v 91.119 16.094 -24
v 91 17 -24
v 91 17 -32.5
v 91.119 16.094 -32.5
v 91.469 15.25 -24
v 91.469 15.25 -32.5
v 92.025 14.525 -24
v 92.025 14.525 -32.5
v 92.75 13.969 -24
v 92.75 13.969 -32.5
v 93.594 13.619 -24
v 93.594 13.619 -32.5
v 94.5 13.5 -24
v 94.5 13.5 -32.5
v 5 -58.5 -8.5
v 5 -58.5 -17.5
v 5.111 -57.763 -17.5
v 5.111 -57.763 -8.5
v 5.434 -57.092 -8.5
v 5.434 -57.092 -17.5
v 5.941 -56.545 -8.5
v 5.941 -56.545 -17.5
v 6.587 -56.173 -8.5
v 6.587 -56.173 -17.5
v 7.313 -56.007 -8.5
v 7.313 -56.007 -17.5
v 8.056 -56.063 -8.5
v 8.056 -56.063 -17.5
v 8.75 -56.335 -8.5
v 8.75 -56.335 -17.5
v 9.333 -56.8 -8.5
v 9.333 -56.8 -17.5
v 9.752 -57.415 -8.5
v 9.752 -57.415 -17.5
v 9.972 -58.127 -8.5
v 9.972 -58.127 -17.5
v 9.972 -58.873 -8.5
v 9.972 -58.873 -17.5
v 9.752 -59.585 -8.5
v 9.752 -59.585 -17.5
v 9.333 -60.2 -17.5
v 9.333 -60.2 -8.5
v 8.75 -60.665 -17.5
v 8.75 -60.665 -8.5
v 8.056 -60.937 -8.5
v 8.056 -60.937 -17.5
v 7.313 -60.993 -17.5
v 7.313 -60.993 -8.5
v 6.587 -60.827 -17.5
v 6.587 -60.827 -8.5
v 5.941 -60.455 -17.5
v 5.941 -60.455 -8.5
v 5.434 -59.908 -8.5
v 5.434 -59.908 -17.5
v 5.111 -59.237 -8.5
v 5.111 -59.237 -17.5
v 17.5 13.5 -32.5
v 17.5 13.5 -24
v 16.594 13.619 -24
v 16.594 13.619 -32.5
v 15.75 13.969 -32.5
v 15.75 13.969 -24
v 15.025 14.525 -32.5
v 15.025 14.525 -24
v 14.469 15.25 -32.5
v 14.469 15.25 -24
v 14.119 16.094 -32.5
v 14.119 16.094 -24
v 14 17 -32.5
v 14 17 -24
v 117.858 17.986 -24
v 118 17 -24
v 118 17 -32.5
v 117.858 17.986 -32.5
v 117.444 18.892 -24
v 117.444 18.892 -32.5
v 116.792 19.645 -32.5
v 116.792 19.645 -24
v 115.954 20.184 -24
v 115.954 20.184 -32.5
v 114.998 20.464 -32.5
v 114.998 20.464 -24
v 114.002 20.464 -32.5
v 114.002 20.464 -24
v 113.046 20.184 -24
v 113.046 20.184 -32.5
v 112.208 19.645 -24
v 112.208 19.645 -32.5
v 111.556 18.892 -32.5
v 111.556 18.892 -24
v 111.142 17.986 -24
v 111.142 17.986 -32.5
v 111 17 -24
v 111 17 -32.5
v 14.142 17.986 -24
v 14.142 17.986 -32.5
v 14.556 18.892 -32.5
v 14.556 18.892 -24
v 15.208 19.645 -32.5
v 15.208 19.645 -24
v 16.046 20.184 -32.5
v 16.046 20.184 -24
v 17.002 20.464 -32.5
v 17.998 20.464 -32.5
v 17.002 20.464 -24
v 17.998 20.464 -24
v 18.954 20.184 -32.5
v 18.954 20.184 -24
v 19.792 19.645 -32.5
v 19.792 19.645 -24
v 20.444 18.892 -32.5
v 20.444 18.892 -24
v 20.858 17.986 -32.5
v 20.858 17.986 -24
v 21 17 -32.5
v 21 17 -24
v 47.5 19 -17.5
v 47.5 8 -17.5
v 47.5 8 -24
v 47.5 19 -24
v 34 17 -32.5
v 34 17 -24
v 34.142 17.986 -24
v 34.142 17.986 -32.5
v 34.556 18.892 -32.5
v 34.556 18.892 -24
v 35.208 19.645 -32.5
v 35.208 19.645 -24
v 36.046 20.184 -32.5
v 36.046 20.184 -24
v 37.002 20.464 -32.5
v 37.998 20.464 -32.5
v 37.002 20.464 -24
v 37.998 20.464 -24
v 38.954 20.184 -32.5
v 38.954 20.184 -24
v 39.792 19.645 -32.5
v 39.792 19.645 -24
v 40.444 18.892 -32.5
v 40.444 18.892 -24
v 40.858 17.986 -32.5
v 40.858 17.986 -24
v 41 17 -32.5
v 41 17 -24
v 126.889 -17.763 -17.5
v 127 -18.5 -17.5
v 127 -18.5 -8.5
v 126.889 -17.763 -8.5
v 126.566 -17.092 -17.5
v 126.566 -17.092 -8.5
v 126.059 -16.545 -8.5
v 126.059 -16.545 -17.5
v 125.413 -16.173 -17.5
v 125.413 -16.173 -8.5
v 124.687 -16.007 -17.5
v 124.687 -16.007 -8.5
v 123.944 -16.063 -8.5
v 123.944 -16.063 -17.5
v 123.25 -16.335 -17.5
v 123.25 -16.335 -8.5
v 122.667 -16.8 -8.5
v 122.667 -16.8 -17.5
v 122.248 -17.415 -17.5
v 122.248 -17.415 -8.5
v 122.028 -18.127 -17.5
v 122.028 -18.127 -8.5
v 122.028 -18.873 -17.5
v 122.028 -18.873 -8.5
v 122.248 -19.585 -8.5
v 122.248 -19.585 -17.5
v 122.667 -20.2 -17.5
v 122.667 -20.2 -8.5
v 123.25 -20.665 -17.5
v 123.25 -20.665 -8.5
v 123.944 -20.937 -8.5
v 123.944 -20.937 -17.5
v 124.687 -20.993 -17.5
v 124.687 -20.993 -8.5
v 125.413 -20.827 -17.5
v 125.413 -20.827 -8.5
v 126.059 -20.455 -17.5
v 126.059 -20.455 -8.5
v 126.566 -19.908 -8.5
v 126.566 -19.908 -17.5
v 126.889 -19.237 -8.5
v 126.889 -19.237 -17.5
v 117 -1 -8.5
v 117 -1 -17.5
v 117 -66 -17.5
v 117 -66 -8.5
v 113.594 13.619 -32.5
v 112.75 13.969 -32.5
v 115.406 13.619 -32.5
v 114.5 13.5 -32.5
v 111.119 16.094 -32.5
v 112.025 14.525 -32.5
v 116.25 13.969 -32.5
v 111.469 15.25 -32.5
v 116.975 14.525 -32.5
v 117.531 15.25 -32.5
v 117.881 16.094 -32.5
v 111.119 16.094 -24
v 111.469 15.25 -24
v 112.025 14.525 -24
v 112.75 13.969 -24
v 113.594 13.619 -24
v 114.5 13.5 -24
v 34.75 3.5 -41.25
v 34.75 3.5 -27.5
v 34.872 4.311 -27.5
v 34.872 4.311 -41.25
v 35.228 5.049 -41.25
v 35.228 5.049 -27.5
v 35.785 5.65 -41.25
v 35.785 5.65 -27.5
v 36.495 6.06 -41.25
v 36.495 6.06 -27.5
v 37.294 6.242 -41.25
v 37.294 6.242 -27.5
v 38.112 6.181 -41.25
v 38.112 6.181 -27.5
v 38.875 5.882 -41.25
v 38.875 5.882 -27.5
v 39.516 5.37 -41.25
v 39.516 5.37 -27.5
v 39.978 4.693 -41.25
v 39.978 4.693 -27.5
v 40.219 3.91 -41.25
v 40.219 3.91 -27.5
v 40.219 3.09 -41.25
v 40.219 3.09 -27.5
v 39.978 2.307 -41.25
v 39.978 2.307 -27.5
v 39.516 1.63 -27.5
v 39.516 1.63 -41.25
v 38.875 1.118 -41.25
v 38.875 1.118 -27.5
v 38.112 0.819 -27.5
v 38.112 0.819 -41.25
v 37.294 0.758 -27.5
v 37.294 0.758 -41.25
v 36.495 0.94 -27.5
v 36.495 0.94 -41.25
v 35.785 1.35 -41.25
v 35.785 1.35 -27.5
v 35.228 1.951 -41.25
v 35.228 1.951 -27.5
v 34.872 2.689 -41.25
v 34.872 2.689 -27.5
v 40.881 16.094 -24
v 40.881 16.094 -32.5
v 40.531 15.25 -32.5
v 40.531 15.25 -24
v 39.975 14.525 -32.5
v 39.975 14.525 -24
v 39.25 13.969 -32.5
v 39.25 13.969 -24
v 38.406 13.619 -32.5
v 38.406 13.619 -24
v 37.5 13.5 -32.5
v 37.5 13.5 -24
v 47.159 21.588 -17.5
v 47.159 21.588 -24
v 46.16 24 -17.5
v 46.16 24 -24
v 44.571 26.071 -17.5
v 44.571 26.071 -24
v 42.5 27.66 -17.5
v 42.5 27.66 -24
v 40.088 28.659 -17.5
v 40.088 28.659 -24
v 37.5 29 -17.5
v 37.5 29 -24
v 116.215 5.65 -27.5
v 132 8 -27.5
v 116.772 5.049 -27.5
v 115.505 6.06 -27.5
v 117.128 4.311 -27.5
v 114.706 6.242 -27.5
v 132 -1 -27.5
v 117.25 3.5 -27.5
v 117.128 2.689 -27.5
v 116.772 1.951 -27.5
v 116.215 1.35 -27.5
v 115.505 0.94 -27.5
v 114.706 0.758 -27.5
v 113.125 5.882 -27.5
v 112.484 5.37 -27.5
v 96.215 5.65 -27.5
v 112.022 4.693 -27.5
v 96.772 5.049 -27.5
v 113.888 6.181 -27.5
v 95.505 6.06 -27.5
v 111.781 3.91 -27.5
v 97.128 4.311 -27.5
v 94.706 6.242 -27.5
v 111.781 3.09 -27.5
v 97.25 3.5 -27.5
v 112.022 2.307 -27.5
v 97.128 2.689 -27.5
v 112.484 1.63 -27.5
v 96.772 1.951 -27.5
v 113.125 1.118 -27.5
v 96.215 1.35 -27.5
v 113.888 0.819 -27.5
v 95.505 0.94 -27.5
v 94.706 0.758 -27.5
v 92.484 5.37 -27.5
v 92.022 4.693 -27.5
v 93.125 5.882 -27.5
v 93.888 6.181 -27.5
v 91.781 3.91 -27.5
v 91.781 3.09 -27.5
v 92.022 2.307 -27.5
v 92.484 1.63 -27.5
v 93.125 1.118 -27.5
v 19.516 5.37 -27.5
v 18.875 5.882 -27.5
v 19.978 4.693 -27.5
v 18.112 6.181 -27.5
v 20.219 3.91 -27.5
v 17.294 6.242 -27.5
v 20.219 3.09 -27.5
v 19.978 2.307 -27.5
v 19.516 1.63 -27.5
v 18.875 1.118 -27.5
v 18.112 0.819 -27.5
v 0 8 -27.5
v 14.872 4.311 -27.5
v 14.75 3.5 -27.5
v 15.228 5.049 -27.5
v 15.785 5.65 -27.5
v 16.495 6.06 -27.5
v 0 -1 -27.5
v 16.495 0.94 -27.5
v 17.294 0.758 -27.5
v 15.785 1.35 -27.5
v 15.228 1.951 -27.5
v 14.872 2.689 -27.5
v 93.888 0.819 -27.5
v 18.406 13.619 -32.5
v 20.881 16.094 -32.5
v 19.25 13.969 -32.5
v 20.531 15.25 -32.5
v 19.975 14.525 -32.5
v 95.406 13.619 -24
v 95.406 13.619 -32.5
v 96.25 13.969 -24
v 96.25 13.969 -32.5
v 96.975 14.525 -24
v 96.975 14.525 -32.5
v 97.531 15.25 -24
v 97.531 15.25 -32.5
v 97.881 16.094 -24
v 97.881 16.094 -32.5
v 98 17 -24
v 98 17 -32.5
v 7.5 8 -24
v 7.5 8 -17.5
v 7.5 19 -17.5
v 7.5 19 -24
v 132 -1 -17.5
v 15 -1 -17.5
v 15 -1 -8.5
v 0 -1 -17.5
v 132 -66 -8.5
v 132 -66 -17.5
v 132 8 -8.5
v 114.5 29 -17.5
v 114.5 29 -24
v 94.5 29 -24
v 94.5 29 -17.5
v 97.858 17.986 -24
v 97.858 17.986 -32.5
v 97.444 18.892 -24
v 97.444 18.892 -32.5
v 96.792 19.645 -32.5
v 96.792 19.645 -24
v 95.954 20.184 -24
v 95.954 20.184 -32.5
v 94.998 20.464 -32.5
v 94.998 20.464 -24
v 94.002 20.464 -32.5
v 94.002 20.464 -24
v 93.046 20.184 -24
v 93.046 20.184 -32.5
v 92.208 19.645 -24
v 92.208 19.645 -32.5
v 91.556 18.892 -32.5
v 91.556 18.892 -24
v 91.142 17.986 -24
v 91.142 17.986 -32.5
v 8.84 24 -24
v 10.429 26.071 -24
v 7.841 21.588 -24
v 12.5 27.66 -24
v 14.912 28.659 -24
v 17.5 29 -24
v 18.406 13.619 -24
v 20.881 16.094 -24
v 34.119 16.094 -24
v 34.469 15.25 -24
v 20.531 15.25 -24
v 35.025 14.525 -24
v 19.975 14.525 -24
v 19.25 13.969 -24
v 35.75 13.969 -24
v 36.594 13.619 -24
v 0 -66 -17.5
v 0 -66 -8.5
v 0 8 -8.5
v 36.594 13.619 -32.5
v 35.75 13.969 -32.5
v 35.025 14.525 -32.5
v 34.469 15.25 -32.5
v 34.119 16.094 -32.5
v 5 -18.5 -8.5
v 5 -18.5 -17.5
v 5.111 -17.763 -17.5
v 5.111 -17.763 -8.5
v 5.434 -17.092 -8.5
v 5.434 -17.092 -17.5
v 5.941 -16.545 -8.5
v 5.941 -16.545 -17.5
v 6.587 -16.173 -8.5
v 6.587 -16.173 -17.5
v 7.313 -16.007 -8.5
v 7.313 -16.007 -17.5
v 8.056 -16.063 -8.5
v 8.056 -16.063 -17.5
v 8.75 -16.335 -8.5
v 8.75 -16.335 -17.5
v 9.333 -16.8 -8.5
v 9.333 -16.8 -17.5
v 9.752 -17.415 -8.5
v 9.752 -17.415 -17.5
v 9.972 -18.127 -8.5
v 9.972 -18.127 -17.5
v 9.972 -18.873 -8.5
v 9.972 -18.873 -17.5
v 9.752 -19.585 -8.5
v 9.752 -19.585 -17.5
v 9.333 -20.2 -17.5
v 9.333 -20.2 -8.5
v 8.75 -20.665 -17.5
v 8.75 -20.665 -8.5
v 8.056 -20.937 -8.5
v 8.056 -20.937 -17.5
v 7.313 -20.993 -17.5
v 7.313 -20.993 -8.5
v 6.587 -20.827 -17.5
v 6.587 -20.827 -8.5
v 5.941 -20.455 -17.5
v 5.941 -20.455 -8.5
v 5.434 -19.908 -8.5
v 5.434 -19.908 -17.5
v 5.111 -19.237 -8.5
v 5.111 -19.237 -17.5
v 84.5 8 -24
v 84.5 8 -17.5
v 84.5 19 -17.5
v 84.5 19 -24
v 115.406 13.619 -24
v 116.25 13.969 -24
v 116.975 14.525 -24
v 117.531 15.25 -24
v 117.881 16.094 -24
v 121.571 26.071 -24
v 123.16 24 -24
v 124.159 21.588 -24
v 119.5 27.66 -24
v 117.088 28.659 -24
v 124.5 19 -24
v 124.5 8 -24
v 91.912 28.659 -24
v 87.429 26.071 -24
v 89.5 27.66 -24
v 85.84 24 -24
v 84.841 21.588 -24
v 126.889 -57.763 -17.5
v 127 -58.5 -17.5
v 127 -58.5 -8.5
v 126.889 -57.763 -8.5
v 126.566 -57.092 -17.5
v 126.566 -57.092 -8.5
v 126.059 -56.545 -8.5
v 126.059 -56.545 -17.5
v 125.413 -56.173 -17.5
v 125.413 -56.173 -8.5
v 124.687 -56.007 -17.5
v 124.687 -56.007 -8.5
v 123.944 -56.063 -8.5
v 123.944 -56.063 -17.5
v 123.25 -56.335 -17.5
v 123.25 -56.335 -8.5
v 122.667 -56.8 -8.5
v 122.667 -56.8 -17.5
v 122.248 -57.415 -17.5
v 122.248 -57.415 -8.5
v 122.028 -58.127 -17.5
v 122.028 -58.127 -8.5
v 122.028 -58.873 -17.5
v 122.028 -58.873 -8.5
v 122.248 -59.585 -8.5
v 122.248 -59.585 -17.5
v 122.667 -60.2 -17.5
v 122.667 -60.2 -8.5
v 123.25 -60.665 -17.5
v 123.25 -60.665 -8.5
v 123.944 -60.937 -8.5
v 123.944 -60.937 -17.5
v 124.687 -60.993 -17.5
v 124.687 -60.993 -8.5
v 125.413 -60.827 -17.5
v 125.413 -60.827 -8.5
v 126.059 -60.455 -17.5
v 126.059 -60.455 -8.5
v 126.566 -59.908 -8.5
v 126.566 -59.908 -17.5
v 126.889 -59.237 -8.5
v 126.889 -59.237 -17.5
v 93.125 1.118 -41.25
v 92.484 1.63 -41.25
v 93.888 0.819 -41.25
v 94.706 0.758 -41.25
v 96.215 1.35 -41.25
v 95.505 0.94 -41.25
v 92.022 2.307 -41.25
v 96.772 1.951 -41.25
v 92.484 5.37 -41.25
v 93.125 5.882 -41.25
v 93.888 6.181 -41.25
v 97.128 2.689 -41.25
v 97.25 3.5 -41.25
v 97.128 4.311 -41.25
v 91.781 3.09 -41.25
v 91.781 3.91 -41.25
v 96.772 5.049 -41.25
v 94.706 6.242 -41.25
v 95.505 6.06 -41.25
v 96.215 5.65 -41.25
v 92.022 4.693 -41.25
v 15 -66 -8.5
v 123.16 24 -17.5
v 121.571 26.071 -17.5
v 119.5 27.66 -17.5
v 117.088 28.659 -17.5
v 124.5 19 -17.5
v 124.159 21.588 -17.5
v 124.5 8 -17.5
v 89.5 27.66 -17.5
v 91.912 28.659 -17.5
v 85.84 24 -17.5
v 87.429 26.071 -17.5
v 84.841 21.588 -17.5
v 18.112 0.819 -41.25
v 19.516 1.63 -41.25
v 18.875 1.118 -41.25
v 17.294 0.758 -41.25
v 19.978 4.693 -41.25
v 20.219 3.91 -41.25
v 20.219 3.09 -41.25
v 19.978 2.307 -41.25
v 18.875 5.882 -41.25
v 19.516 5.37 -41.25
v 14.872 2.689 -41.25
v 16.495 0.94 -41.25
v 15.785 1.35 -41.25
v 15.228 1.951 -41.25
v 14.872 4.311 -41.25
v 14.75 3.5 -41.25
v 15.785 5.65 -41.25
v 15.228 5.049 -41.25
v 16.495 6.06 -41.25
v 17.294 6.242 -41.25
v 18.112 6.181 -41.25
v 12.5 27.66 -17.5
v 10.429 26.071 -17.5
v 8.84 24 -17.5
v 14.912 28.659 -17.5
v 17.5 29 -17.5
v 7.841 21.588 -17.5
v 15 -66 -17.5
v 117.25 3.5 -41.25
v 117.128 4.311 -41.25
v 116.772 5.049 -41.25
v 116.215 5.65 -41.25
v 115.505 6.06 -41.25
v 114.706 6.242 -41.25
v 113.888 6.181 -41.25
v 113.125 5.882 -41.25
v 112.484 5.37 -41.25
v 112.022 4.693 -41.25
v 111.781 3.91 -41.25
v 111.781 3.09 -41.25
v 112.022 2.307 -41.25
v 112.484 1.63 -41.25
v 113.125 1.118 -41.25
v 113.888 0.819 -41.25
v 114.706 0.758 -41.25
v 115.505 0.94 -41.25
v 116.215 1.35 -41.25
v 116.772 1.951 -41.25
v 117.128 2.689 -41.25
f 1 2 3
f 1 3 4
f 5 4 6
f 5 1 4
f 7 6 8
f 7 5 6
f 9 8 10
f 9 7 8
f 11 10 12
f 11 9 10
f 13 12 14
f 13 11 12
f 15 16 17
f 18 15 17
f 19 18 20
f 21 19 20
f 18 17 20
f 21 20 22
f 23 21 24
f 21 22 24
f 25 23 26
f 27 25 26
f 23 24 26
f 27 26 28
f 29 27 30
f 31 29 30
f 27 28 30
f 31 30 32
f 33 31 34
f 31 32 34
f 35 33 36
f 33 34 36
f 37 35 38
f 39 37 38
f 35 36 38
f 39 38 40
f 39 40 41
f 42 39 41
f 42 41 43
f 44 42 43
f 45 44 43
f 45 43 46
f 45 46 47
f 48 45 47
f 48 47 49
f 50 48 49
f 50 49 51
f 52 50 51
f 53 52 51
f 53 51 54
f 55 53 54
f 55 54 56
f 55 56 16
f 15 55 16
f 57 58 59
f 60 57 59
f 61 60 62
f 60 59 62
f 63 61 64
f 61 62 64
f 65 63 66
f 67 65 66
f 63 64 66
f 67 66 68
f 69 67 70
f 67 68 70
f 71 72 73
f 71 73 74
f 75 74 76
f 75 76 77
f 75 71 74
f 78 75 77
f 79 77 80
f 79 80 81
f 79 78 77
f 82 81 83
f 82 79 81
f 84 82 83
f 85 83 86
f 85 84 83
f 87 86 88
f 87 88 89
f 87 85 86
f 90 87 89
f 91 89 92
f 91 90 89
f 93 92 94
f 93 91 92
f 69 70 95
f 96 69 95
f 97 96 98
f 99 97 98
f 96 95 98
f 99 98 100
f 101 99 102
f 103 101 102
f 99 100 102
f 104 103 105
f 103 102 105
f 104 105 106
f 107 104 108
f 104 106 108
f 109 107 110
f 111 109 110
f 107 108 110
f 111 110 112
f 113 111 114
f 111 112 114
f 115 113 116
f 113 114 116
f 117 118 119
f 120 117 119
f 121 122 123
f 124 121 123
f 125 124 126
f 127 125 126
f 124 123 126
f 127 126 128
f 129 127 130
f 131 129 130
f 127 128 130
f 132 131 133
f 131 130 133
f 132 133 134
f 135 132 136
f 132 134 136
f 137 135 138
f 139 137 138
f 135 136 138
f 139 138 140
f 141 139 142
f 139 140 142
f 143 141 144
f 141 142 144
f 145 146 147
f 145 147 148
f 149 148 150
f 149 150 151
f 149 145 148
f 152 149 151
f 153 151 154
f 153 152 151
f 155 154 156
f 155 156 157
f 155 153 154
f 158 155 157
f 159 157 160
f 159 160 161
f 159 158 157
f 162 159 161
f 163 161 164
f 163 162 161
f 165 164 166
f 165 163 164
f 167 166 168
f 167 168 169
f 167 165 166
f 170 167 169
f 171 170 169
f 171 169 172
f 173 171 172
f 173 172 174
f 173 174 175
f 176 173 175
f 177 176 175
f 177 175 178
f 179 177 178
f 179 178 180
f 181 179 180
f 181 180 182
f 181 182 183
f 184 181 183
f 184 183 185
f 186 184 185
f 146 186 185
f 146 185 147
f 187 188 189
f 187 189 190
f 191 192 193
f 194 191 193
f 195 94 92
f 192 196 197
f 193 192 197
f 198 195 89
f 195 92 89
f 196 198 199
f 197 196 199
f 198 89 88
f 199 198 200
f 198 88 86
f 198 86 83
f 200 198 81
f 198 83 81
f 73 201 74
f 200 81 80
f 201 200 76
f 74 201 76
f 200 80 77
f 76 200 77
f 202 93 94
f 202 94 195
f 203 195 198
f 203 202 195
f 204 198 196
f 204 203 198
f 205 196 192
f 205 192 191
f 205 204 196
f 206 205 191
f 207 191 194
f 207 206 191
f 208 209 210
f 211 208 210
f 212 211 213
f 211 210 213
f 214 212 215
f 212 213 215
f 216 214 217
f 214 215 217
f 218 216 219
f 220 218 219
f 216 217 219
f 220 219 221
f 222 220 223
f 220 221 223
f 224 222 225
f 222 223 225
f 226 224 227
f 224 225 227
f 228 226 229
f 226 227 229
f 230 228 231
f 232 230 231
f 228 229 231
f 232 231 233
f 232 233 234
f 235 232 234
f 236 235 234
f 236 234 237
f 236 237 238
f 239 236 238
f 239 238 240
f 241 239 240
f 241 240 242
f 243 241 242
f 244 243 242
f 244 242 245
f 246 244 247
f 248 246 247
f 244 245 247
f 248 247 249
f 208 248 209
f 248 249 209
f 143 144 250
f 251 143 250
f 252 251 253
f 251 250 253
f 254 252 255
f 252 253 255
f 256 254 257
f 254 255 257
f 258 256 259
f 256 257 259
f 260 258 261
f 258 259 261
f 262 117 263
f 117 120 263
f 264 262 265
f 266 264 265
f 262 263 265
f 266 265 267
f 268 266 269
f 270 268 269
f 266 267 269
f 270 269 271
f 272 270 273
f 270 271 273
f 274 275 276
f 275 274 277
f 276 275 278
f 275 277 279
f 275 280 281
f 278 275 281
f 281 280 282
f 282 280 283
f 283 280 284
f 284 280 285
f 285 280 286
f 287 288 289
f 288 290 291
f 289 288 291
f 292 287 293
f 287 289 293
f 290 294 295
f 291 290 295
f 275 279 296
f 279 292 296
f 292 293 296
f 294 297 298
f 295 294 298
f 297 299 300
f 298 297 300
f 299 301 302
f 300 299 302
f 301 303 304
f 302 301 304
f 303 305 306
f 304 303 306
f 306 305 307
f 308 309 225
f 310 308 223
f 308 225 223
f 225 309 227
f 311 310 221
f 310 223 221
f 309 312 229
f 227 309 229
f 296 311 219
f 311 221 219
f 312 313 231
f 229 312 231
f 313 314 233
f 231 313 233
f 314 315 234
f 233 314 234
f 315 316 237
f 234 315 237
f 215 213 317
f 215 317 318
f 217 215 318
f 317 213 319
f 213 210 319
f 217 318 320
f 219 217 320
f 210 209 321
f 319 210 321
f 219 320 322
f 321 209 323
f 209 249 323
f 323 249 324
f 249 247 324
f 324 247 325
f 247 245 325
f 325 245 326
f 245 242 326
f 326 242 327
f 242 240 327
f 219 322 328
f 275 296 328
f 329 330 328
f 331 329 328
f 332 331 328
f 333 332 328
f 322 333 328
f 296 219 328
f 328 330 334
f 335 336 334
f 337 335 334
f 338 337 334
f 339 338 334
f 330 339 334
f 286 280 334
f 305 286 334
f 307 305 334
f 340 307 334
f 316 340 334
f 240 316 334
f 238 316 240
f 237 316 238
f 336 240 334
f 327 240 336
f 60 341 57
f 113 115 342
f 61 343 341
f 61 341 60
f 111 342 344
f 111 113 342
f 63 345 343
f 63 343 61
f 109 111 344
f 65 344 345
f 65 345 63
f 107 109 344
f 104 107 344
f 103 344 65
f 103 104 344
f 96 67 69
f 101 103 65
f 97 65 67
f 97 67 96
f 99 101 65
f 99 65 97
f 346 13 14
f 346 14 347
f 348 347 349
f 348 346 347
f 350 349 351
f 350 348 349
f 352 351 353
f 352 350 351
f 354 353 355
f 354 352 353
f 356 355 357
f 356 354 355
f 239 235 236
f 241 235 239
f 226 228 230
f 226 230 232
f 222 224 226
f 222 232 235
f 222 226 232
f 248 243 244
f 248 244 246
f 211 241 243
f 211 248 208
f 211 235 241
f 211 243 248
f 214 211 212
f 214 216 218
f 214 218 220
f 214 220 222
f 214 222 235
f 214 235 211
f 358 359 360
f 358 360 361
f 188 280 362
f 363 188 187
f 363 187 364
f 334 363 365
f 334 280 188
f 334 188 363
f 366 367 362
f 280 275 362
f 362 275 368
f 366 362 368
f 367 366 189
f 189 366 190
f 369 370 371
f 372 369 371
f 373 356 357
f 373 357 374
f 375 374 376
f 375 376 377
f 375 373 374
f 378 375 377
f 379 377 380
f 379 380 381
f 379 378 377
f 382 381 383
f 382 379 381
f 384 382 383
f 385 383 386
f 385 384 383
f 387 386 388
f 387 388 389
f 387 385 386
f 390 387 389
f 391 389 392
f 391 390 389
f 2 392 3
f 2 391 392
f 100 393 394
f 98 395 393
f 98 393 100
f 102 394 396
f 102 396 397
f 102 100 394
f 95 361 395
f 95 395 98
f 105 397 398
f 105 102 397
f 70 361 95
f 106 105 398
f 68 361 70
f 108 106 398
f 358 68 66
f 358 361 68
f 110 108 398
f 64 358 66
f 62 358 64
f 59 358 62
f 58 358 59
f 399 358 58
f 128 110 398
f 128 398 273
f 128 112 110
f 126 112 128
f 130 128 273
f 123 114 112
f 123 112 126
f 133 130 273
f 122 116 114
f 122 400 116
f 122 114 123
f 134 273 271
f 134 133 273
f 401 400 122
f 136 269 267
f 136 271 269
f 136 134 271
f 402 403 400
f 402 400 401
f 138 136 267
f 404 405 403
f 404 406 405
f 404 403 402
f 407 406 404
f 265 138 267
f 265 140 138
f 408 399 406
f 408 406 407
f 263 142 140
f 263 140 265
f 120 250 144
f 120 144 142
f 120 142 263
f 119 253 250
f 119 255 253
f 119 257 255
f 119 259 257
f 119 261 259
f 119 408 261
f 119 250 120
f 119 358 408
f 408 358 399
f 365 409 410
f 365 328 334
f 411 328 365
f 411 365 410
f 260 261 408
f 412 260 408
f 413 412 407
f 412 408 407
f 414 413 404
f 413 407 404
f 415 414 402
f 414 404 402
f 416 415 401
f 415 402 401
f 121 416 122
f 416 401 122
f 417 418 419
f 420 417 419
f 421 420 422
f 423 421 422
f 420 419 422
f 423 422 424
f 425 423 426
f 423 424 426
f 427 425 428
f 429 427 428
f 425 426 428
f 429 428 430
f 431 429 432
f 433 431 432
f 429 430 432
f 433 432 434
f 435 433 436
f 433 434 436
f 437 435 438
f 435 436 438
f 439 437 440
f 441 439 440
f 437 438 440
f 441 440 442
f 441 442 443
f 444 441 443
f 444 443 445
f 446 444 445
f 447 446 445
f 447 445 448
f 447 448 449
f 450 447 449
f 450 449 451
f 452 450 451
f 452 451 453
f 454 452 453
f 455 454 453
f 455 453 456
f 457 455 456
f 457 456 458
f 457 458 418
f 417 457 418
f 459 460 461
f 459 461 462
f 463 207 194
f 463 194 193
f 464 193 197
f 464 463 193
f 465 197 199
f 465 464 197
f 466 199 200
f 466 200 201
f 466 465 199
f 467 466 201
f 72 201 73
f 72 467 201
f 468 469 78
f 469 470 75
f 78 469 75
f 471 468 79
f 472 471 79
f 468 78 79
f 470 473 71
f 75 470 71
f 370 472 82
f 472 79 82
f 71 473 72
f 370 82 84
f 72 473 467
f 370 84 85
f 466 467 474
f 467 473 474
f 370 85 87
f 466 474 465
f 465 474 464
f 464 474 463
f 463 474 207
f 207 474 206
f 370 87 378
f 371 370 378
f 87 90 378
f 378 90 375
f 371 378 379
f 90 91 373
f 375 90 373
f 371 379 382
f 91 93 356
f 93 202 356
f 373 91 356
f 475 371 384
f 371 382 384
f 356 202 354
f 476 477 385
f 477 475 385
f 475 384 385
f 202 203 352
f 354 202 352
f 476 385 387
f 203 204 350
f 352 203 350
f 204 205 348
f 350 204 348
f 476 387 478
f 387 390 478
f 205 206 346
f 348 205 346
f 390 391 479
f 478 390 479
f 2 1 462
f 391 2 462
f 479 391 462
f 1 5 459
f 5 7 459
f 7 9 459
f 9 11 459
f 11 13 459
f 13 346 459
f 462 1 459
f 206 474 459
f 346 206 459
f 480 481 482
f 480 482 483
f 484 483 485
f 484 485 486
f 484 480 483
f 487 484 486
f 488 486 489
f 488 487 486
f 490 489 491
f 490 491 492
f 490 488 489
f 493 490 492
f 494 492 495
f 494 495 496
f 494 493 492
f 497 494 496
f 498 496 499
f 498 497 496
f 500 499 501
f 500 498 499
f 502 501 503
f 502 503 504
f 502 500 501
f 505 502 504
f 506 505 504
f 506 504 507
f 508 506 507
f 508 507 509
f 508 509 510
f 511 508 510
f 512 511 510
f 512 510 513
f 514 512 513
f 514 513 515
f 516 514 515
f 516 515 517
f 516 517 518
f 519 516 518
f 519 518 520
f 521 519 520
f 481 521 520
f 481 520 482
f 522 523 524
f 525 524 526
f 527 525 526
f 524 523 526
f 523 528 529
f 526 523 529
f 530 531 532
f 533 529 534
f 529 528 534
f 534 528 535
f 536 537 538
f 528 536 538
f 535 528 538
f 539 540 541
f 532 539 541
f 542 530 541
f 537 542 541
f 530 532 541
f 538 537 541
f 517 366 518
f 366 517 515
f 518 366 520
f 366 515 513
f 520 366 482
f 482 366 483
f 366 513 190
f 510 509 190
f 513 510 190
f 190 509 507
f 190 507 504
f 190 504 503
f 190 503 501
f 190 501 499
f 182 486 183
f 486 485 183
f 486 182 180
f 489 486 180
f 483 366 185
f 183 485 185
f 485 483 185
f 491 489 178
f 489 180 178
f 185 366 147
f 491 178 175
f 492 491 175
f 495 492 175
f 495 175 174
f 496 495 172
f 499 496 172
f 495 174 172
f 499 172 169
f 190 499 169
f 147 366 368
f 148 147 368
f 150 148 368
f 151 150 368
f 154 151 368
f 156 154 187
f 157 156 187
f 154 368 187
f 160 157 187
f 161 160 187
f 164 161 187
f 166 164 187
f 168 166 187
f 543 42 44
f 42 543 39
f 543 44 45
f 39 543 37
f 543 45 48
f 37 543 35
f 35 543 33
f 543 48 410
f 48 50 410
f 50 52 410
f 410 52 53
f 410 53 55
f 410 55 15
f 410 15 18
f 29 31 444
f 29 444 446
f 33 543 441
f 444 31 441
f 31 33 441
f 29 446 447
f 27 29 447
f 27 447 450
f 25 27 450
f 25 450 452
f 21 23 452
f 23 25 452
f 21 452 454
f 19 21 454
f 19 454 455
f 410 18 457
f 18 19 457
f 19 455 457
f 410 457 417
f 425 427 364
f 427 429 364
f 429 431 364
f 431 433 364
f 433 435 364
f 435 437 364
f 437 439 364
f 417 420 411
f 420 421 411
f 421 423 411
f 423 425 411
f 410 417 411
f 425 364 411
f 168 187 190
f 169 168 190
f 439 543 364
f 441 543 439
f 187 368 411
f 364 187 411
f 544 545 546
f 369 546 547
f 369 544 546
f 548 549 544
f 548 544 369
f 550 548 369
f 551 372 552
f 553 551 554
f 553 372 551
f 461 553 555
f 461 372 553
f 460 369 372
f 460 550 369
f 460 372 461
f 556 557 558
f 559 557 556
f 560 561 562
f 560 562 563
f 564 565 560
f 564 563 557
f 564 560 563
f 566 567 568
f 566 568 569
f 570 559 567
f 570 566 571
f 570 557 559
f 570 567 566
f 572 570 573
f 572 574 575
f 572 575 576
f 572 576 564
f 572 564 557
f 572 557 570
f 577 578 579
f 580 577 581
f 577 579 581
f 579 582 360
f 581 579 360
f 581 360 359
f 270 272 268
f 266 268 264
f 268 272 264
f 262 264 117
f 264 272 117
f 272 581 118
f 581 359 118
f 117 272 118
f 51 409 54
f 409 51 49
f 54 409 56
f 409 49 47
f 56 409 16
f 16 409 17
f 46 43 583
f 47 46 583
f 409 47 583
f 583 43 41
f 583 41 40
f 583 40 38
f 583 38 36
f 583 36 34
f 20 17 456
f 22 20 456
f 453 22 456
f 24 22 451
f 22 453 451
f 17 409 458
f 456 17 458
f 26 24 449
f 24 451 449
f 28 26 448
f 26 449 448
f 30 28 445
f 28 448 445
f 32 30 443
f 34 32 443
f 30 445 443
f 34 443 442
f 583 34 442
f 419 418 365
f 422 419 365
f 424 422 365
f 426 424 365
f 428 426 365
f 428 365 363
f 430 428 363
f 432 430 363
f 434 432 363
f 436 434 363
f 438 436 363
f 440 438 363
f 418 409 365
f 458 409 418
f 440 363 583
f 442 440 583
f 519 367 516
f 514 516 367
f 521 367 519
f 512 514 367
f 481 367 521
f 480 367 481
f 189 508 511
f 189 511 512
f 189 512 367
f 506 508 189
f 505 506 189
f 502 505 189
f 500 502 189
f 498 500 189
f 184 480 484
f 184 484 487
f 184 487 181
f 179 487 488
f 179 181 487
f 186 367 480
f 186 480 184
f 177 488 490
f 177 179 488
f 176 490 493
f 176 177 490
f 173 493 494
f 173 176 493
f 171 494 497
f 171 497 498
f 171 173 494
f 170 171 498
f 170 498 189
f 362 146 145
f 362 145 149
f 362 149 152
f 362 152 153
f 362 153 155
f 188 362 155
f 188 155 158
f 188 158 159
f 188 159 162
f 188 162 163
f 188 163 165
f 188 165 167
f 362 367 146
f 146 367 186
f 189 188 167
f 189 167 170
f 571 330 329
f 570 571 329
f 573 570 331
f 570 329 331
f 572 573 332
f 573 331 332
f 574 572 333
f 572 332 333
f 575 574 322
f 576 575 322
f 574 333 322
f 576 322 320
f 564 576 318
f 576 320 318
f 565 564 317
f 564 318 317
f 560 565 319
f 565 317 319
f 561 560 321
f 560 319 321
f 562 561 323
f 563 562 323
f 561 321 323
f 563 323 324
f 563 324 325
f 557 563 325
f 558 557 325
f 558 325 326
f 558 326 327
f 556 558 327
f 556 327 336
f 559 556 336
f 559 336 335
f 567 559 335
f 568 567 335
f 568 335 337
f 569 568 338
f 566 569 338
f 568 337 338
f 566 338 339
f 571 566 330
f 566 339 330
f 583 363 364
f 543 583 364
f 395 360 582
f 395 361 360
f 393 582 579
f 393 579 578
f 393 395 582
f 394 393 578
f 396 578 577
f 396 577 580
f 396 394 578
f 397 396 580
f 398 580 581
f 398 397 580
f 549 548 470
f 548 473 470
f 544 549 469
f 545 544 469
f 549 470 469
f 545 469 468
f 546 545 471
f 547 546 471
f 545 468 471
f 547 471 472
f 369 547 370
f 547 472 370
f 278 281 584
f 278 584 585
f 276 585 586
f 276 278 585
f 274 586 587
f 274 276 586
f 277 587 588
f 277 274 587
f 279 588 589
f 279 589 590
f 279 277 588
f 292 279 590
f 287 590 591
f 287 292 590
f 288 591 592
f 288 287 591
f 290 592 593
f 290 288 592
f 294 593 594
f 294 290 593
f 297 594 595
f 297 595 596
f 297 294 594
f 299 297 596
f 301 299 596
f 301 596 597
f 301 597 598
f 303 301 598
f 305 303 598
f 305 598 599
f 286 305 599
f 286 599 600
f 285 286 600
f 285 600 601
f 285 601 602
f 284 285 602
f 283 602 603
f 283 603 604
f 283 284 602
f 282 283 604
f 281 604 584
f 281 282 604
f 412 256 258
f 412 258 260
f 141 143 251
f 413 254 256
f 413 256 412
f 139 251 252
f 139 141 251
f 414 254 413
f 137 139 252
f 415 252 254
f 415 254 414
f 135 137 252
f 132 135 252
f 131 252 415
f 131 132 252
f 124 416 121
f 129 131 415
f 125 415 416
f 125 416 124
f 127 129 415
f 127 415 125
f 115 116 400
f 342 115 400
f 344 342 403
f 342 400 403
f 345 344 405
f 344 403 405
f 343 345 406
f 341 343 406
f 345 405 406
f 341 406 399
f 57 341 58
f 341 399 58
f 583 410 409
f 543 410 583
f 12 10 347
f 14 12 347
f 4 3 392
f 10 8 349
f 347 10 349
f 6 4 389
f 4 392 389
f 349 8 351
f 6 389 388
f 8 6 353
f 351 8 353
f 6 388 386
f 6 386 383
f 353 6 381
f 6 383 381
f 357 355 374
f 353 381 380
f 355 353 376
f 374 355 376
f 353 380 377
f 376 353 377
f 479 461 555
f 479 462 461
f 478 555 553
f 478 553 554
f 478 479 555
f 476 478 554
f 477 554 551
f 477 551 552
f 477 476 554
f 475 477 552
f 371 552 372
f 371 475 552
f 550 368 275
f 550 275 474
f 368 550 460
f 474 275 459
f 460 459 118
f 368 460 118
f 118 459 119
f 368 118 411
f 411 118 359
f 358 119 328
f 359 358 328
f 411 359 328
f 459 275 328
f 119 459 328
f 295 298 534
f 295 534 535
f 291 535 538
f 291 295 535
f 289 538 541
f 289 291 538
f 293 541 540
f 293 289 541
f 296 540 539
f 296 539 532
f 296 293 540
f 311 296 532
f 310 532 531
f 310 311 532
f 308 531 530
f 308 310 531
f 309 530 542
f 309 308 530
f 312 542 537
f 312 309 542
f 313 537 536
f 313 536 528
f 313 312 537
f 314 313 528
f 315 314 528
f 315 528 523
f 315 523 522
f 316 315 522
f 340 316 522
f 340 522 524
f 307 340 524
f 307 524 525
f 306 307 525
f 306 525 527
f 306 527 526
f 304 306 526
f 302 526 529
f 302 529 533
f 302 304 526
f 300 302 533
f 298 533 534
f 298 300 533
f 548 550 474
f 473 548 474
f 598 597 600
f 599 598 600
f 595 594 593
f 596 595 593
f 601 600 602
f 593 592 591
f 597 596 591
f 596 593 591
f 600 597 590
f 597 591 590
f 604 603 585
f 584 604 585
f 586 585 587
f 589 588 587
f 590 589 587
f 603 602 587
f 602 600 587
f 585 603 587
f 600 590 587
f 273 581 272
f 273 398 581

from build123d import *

# Parameters (mm, degrees)
BOSS_EXTRUDE2_START  = -1
SKETCH1_W            = 66
SKETCH1_H            = 19
BOSS_EXTRUDE2_DEPTH  = 9
SKETCH3_R            = 2.75
BOSS_EXTRUDE3_DEPTH  = 13.75
SKETCH4_W            = 4.5
SKETCH4_H            = 6.5
BOSS_EXTRUDE4_DEPTH  = 15
BOSS_EXTRUDE5_DEPTH  = 8.5
SKETCH8_W            = 9
SKETCH8_H            = 6.5
BOSS_EXTRUDE6_DEPTH  = 6
SKETCH9_W            = 15.5
SKETCH9_H            = 6.5
BOSS_EXTRUDE7_DEPTH  = 21
BOSS_EXTRUDE8_DEPTH  = 8.5
CUT_EXTRUDE2_START   = -8.5
SKETCH12_R           = 3.5
CUT_EXTRUDE2_DEPTH   = 8.5
FILLET1_R            = 10
SKETCH14_W           = 15
SKETCH14_H           = 9
BOSS_EXTRUDE10_DEPTH = 65
CUT_EXTRUDE3_REACH   = 98.312
SKETCH15_R           = 2.5
FILLET1_OF_MIRROR3_R = 10


with BuildPart() as part:
    # Sketch1 → Boss-Extrude2 (new body)
    with BuildSketch(Plane(origin=(0, 0, 0), x_dir=(1, 0, 0), z_dir=(0, 1, 0)).offset(BOSS_EXTRUDE2_START)):
        with Locations((33, 18)):
            Rectangle(SKETCH1_W, SKETCH1_H)
    boss_extrude2 = extrude(amount=BOSS_EXTRUDE2_DEPTH)

    # Sketch3 → Boss-Extrude3 (add)
    with BuildSketch(Plane(origin=(0, 0, -27.5), x_dir=(-1, 0, 0), z_dir=(0, 0, -1))):
        with Locations((-37.5, 3.5)):
            Circle(SKETCH3_R)
        with Locations((-17.5, 3.5)):
            Circle(SKETCH3_R)
    boss_extrude3 = extrude(amount=BOSS_EXTRUDE3_DEPTH)

    # Sketch4 → Boss-Extrude4 (add)
    with BuildSketch(Plane(origin=(0, 8, 0), x_dir=(1, 0, 0), z_dir=(0, 1, 0))):
        with Locations((25.25, 20.75)):
            Rectangle(SKETCH4_W, SKETCH4_H)
        with Locations((29.75, 20.75)):
            Rectangle(SKETCH4_W, SKETCH4_H)
    boss_extrude4 = extrude(amount=BOSS_EXTRUDE4_DEPTH)

    # Sketch5 → Boss-Extrude5 (add)
    with BuildSketch(Plane(origin=(0, 0, -24), x_dir=(-1, 0, 0), z_dir=(0, 0, -1))):
        with BuildLine():
            ThreePointArc((-25.636419782, 13.037388184), (-24.436298745, 14.307742745), (-24, 16))
            ThreePointArc((-24, 16), (-29.974873734, 18.474873734), (-27.5, 12.5))
            ThreePointArc((-27.5, 12.5), (-26.685966178, 12.595980474), (-25.916578842, 12.878657751))
            ThreePointArc((-25.916578842, 12.878657751), (-25.85405917, 13.094916041), (-25.636419782, 13.037388184))
        make_face()
    extrude(amount=BOSS_EXTRUDE5_DEPTH)

    # Sketch8 → Boss-Extrude6 (add)
    with BuildSketch(Plane(origin=(0, 23, 0), x_dir=(1, 0, 0), z_dir=(0, 1, 0))):
        with Locations((27.5, 20.75)):
            Rectangle(SKETCH8_W, SKETCH8_H)
    boss_extrude6 = extrude(amount=BOSS_EXTRUDE6_DEPTH)

    # Sketch9 → Boss-Extrude7 (add)
    with BuildSketch(Plane(origin=(0, 8, 0), x_dir=(1, 0, 0), z_dir=(0, 1, 0))):
        with Locations((39.75, 20.75)):
            Rectangle(SKETCH9_W, SKETCH9_H)
        with Locations((15.25, 20.75)):
            Rectangle(SKETCH9_W, SKETCH9_H)
    boss_extrude7 = extrude(amount=BOSS_EXTRUDE7_DEPTH)

    # Sketch10 → Boss-Extrude8 (add)
    with BuildSketch(Plane(origin=(0, 0, -24), x_dir=(-1, 0, 0), z_dir=(0, 0, -1))):
        with BuildLine():
            Line((-21, 17), (-17.5, 17))
            Line((-17.5, 17), (-14, 17))
            ThreePointArc((-14, 17), (-17.5, 20.5), (-21, 17))
        make_face()
        with BuildLine():
            Line((-17.5, 13.5), (-17.5, 17))
            Line((-17.5, 17), (-21, 17))
            ThreePointArc((-21, 17), (-19.974873734, 14.525126266), (-17.5, 13.5))
        make_face()
        with BuildLine():
            Line((-14, 17), (-17.5, 17))
            Line((-17.5, 17), (-17.5, 13.5))
            ThreePointArc((-17.5, 13.5), (-15.025126266, 14.525126266), (-14, 17))
        make_face()
        with BuildLine():
            Line((-37.5, 17), (-34, 17))
            ThreePointArc((-34, 17), (-37.5, 20.5), (-41, 17))
            Line((-41, 17), (-37.5, 17))
        make_face()
        with BuildLine():
            ThreePointArc((-37.5, 13.5), (-35.025126266, 14.525126266), (-34, 17))
            Line((-34, 17), (-37.5, 17))
            Line((-37.5, 17), (-37.5, 13.5))
        make_face()
        with BuildLine():
            Line((-37.5, 13.5), (-37.5, 17))
            Line((-37.5, 17), (-41, 17))
            ThreePointArc((-41, 17), (-39.974873734, 14.525126266), (-37.5, 13.5))
        make_face()
    boss_extrude8 = extrude(amount=BOSS_EXTRUDE8_DEPTH)

    # Sketch12 → Cut-Extrude2 (cut)
    with BuildSketch(Plane(origin=(0, 0, -32.5), x_dir=(-1, 0, 0), z_dir=(0, 0, -1)).offset(CUT_EXTRUDE2_START)):
        with Locations((-27.5, 16)):
            Circle(SKETCH12_R)
    extrude(amount=CUT_EXTRUDE2_DEPTH, mode=Mode.SUBTRACT)

    # Fillet1
    fillet1_edges = [part.edges().sort_by_distance(p)[0] for p in [
        (7.5, 29, -20.75),
        (47.5, 29, -20.75),
    ]]
    fillet(fillet1_edges, radius=FILLET1_R)

    # Sketch14 → Boss-Extrude10 (add)
    with BuildSketch(Plane.XZ.offset(1)):
        with Locations((7.5, -13)):
            Rectangle(SKETCH14_W, SKETCH14_H)
    boss_extrude10 = extrude(amount=BOSS_EXTRUDE10_DEPTH)

    # Sketch15 → Cut-Extrude3 (cut, up to next)
    with BuildSketch(Plane(origin=(0, 0, -17.5), x_dir=(-1, 0, 0), z_dir=(0, 0, -1)), mode=Mode.PRIVATE) as cut_extrude3_sk1:
        with Locations((-7.5, -18.5)):
            Circle(SKETCH15_R)
    cut_extrude3_tool1 = extrude(cut_extrude3_sk1.sketch, amount=-CUT_EXTRUDE3_REACH, mode=Mode.PRIVATE) & part.part
    # Sketch15 → Cut-Extrude3 (cut, up to next)
    with BuildSketch(Plane(origin=(0, 0, -17.5), x_dir=(-1, 0, 0), z_dir=(0, 0, -1)), mode=Mode.PRIVATE) as cut_extrude3_sk2:
        with Locations((-7.5, -58.5)):
            Circle(SKETCH15_R)
    cut_extrude3_tool2 = extrude(cut_extrude3_sk2.sketch, amount=-CUT_EXTRUDE3_REACH, mode=Mode.PRIVATE) & part.part
    cut_extrude3_1 = cut_extrude3_tool1.solids().sort_by_distance((7.5, -18.5, -17.5))[0]
    add(cut_extrude3_1, mode=Mode.SUBTRACT)
    cut_extrude3_2 = cut_extrude3_tool2.solids().sort_by_distance((7.5, -58.5, -17.5))[0]
    add(cut_extrude3_2, mode=Mode.SUBTRACT)
    cut_extrude3 = cut_extrude3_1 + cut_extrude3_2  # Cut-Extrude3 as one shape, for the pattern or mirror that repeats it

    # Mirror3: Boss-Extrude2, Boss-Extrude3, Boss-Extrude4, Boss-Extrude6, Boss-Extrude7, Boss-Extrude8, Boss-Extrude10, Cut-Extrude3 across plane
    add(boss_extrude2.mirror(Plane(origin=(66, -1, -8.5), x_dir=(0, 0, 1), z_dir=(1, 0, 0))))
    add(boss_extrude3.mirror(Plane(origin=(66, -1, -8.5), x_dir=(0, 0, 1), z_dir=(1, 0, 0))))
    add(boss_extrude4.mirror(Plane(origin=(66, -1, -8.5), x_dir=(0, 0, 1), z_dir=(1, 0, 0))))
    add(boss_extrude6.mirror(Plane(origin=(66, -1, -8.5), x_dir=(0, 0, 1), z_dir=(1, 0, 0))))
    add(boss_extrude7.mirror(Plane(origin=(66, -1, -8.5), x_dir=(0, 0, 1), z_dir=(1, 0, 0))))
    add(boss_extrude8.mirror(Plane(origin=(66, -1, -8.5), x_dir=(0, 0, 1), z_dir=(1, 0, 0))))
    add(boss_extrude10.mirror(Plane(origin=(66, -1, -8.5), x_dir=(0, 0, 1), z_dir=(1, 0, 0))))
    add(cut_extrude3.mirror(Plane(origin=(66, -1, -8.5), x_dir=(0, 0, 1), z_dir=(1, 0, 0))), mode=Mode.SUBTRACT)

    # Fillet1 of Mirror3
    fillet1_of_mirror3_edges = [part.edges().sort_by_distance(p)[0] for p in [
        (124.5, 29, -20.75),
        (84.5, 29, -20.75),
    ]]
    fillet(fillet1_of_mirror3_edges, radius=FILLET1_OF_MIRROR3_R)


solid = part.part
